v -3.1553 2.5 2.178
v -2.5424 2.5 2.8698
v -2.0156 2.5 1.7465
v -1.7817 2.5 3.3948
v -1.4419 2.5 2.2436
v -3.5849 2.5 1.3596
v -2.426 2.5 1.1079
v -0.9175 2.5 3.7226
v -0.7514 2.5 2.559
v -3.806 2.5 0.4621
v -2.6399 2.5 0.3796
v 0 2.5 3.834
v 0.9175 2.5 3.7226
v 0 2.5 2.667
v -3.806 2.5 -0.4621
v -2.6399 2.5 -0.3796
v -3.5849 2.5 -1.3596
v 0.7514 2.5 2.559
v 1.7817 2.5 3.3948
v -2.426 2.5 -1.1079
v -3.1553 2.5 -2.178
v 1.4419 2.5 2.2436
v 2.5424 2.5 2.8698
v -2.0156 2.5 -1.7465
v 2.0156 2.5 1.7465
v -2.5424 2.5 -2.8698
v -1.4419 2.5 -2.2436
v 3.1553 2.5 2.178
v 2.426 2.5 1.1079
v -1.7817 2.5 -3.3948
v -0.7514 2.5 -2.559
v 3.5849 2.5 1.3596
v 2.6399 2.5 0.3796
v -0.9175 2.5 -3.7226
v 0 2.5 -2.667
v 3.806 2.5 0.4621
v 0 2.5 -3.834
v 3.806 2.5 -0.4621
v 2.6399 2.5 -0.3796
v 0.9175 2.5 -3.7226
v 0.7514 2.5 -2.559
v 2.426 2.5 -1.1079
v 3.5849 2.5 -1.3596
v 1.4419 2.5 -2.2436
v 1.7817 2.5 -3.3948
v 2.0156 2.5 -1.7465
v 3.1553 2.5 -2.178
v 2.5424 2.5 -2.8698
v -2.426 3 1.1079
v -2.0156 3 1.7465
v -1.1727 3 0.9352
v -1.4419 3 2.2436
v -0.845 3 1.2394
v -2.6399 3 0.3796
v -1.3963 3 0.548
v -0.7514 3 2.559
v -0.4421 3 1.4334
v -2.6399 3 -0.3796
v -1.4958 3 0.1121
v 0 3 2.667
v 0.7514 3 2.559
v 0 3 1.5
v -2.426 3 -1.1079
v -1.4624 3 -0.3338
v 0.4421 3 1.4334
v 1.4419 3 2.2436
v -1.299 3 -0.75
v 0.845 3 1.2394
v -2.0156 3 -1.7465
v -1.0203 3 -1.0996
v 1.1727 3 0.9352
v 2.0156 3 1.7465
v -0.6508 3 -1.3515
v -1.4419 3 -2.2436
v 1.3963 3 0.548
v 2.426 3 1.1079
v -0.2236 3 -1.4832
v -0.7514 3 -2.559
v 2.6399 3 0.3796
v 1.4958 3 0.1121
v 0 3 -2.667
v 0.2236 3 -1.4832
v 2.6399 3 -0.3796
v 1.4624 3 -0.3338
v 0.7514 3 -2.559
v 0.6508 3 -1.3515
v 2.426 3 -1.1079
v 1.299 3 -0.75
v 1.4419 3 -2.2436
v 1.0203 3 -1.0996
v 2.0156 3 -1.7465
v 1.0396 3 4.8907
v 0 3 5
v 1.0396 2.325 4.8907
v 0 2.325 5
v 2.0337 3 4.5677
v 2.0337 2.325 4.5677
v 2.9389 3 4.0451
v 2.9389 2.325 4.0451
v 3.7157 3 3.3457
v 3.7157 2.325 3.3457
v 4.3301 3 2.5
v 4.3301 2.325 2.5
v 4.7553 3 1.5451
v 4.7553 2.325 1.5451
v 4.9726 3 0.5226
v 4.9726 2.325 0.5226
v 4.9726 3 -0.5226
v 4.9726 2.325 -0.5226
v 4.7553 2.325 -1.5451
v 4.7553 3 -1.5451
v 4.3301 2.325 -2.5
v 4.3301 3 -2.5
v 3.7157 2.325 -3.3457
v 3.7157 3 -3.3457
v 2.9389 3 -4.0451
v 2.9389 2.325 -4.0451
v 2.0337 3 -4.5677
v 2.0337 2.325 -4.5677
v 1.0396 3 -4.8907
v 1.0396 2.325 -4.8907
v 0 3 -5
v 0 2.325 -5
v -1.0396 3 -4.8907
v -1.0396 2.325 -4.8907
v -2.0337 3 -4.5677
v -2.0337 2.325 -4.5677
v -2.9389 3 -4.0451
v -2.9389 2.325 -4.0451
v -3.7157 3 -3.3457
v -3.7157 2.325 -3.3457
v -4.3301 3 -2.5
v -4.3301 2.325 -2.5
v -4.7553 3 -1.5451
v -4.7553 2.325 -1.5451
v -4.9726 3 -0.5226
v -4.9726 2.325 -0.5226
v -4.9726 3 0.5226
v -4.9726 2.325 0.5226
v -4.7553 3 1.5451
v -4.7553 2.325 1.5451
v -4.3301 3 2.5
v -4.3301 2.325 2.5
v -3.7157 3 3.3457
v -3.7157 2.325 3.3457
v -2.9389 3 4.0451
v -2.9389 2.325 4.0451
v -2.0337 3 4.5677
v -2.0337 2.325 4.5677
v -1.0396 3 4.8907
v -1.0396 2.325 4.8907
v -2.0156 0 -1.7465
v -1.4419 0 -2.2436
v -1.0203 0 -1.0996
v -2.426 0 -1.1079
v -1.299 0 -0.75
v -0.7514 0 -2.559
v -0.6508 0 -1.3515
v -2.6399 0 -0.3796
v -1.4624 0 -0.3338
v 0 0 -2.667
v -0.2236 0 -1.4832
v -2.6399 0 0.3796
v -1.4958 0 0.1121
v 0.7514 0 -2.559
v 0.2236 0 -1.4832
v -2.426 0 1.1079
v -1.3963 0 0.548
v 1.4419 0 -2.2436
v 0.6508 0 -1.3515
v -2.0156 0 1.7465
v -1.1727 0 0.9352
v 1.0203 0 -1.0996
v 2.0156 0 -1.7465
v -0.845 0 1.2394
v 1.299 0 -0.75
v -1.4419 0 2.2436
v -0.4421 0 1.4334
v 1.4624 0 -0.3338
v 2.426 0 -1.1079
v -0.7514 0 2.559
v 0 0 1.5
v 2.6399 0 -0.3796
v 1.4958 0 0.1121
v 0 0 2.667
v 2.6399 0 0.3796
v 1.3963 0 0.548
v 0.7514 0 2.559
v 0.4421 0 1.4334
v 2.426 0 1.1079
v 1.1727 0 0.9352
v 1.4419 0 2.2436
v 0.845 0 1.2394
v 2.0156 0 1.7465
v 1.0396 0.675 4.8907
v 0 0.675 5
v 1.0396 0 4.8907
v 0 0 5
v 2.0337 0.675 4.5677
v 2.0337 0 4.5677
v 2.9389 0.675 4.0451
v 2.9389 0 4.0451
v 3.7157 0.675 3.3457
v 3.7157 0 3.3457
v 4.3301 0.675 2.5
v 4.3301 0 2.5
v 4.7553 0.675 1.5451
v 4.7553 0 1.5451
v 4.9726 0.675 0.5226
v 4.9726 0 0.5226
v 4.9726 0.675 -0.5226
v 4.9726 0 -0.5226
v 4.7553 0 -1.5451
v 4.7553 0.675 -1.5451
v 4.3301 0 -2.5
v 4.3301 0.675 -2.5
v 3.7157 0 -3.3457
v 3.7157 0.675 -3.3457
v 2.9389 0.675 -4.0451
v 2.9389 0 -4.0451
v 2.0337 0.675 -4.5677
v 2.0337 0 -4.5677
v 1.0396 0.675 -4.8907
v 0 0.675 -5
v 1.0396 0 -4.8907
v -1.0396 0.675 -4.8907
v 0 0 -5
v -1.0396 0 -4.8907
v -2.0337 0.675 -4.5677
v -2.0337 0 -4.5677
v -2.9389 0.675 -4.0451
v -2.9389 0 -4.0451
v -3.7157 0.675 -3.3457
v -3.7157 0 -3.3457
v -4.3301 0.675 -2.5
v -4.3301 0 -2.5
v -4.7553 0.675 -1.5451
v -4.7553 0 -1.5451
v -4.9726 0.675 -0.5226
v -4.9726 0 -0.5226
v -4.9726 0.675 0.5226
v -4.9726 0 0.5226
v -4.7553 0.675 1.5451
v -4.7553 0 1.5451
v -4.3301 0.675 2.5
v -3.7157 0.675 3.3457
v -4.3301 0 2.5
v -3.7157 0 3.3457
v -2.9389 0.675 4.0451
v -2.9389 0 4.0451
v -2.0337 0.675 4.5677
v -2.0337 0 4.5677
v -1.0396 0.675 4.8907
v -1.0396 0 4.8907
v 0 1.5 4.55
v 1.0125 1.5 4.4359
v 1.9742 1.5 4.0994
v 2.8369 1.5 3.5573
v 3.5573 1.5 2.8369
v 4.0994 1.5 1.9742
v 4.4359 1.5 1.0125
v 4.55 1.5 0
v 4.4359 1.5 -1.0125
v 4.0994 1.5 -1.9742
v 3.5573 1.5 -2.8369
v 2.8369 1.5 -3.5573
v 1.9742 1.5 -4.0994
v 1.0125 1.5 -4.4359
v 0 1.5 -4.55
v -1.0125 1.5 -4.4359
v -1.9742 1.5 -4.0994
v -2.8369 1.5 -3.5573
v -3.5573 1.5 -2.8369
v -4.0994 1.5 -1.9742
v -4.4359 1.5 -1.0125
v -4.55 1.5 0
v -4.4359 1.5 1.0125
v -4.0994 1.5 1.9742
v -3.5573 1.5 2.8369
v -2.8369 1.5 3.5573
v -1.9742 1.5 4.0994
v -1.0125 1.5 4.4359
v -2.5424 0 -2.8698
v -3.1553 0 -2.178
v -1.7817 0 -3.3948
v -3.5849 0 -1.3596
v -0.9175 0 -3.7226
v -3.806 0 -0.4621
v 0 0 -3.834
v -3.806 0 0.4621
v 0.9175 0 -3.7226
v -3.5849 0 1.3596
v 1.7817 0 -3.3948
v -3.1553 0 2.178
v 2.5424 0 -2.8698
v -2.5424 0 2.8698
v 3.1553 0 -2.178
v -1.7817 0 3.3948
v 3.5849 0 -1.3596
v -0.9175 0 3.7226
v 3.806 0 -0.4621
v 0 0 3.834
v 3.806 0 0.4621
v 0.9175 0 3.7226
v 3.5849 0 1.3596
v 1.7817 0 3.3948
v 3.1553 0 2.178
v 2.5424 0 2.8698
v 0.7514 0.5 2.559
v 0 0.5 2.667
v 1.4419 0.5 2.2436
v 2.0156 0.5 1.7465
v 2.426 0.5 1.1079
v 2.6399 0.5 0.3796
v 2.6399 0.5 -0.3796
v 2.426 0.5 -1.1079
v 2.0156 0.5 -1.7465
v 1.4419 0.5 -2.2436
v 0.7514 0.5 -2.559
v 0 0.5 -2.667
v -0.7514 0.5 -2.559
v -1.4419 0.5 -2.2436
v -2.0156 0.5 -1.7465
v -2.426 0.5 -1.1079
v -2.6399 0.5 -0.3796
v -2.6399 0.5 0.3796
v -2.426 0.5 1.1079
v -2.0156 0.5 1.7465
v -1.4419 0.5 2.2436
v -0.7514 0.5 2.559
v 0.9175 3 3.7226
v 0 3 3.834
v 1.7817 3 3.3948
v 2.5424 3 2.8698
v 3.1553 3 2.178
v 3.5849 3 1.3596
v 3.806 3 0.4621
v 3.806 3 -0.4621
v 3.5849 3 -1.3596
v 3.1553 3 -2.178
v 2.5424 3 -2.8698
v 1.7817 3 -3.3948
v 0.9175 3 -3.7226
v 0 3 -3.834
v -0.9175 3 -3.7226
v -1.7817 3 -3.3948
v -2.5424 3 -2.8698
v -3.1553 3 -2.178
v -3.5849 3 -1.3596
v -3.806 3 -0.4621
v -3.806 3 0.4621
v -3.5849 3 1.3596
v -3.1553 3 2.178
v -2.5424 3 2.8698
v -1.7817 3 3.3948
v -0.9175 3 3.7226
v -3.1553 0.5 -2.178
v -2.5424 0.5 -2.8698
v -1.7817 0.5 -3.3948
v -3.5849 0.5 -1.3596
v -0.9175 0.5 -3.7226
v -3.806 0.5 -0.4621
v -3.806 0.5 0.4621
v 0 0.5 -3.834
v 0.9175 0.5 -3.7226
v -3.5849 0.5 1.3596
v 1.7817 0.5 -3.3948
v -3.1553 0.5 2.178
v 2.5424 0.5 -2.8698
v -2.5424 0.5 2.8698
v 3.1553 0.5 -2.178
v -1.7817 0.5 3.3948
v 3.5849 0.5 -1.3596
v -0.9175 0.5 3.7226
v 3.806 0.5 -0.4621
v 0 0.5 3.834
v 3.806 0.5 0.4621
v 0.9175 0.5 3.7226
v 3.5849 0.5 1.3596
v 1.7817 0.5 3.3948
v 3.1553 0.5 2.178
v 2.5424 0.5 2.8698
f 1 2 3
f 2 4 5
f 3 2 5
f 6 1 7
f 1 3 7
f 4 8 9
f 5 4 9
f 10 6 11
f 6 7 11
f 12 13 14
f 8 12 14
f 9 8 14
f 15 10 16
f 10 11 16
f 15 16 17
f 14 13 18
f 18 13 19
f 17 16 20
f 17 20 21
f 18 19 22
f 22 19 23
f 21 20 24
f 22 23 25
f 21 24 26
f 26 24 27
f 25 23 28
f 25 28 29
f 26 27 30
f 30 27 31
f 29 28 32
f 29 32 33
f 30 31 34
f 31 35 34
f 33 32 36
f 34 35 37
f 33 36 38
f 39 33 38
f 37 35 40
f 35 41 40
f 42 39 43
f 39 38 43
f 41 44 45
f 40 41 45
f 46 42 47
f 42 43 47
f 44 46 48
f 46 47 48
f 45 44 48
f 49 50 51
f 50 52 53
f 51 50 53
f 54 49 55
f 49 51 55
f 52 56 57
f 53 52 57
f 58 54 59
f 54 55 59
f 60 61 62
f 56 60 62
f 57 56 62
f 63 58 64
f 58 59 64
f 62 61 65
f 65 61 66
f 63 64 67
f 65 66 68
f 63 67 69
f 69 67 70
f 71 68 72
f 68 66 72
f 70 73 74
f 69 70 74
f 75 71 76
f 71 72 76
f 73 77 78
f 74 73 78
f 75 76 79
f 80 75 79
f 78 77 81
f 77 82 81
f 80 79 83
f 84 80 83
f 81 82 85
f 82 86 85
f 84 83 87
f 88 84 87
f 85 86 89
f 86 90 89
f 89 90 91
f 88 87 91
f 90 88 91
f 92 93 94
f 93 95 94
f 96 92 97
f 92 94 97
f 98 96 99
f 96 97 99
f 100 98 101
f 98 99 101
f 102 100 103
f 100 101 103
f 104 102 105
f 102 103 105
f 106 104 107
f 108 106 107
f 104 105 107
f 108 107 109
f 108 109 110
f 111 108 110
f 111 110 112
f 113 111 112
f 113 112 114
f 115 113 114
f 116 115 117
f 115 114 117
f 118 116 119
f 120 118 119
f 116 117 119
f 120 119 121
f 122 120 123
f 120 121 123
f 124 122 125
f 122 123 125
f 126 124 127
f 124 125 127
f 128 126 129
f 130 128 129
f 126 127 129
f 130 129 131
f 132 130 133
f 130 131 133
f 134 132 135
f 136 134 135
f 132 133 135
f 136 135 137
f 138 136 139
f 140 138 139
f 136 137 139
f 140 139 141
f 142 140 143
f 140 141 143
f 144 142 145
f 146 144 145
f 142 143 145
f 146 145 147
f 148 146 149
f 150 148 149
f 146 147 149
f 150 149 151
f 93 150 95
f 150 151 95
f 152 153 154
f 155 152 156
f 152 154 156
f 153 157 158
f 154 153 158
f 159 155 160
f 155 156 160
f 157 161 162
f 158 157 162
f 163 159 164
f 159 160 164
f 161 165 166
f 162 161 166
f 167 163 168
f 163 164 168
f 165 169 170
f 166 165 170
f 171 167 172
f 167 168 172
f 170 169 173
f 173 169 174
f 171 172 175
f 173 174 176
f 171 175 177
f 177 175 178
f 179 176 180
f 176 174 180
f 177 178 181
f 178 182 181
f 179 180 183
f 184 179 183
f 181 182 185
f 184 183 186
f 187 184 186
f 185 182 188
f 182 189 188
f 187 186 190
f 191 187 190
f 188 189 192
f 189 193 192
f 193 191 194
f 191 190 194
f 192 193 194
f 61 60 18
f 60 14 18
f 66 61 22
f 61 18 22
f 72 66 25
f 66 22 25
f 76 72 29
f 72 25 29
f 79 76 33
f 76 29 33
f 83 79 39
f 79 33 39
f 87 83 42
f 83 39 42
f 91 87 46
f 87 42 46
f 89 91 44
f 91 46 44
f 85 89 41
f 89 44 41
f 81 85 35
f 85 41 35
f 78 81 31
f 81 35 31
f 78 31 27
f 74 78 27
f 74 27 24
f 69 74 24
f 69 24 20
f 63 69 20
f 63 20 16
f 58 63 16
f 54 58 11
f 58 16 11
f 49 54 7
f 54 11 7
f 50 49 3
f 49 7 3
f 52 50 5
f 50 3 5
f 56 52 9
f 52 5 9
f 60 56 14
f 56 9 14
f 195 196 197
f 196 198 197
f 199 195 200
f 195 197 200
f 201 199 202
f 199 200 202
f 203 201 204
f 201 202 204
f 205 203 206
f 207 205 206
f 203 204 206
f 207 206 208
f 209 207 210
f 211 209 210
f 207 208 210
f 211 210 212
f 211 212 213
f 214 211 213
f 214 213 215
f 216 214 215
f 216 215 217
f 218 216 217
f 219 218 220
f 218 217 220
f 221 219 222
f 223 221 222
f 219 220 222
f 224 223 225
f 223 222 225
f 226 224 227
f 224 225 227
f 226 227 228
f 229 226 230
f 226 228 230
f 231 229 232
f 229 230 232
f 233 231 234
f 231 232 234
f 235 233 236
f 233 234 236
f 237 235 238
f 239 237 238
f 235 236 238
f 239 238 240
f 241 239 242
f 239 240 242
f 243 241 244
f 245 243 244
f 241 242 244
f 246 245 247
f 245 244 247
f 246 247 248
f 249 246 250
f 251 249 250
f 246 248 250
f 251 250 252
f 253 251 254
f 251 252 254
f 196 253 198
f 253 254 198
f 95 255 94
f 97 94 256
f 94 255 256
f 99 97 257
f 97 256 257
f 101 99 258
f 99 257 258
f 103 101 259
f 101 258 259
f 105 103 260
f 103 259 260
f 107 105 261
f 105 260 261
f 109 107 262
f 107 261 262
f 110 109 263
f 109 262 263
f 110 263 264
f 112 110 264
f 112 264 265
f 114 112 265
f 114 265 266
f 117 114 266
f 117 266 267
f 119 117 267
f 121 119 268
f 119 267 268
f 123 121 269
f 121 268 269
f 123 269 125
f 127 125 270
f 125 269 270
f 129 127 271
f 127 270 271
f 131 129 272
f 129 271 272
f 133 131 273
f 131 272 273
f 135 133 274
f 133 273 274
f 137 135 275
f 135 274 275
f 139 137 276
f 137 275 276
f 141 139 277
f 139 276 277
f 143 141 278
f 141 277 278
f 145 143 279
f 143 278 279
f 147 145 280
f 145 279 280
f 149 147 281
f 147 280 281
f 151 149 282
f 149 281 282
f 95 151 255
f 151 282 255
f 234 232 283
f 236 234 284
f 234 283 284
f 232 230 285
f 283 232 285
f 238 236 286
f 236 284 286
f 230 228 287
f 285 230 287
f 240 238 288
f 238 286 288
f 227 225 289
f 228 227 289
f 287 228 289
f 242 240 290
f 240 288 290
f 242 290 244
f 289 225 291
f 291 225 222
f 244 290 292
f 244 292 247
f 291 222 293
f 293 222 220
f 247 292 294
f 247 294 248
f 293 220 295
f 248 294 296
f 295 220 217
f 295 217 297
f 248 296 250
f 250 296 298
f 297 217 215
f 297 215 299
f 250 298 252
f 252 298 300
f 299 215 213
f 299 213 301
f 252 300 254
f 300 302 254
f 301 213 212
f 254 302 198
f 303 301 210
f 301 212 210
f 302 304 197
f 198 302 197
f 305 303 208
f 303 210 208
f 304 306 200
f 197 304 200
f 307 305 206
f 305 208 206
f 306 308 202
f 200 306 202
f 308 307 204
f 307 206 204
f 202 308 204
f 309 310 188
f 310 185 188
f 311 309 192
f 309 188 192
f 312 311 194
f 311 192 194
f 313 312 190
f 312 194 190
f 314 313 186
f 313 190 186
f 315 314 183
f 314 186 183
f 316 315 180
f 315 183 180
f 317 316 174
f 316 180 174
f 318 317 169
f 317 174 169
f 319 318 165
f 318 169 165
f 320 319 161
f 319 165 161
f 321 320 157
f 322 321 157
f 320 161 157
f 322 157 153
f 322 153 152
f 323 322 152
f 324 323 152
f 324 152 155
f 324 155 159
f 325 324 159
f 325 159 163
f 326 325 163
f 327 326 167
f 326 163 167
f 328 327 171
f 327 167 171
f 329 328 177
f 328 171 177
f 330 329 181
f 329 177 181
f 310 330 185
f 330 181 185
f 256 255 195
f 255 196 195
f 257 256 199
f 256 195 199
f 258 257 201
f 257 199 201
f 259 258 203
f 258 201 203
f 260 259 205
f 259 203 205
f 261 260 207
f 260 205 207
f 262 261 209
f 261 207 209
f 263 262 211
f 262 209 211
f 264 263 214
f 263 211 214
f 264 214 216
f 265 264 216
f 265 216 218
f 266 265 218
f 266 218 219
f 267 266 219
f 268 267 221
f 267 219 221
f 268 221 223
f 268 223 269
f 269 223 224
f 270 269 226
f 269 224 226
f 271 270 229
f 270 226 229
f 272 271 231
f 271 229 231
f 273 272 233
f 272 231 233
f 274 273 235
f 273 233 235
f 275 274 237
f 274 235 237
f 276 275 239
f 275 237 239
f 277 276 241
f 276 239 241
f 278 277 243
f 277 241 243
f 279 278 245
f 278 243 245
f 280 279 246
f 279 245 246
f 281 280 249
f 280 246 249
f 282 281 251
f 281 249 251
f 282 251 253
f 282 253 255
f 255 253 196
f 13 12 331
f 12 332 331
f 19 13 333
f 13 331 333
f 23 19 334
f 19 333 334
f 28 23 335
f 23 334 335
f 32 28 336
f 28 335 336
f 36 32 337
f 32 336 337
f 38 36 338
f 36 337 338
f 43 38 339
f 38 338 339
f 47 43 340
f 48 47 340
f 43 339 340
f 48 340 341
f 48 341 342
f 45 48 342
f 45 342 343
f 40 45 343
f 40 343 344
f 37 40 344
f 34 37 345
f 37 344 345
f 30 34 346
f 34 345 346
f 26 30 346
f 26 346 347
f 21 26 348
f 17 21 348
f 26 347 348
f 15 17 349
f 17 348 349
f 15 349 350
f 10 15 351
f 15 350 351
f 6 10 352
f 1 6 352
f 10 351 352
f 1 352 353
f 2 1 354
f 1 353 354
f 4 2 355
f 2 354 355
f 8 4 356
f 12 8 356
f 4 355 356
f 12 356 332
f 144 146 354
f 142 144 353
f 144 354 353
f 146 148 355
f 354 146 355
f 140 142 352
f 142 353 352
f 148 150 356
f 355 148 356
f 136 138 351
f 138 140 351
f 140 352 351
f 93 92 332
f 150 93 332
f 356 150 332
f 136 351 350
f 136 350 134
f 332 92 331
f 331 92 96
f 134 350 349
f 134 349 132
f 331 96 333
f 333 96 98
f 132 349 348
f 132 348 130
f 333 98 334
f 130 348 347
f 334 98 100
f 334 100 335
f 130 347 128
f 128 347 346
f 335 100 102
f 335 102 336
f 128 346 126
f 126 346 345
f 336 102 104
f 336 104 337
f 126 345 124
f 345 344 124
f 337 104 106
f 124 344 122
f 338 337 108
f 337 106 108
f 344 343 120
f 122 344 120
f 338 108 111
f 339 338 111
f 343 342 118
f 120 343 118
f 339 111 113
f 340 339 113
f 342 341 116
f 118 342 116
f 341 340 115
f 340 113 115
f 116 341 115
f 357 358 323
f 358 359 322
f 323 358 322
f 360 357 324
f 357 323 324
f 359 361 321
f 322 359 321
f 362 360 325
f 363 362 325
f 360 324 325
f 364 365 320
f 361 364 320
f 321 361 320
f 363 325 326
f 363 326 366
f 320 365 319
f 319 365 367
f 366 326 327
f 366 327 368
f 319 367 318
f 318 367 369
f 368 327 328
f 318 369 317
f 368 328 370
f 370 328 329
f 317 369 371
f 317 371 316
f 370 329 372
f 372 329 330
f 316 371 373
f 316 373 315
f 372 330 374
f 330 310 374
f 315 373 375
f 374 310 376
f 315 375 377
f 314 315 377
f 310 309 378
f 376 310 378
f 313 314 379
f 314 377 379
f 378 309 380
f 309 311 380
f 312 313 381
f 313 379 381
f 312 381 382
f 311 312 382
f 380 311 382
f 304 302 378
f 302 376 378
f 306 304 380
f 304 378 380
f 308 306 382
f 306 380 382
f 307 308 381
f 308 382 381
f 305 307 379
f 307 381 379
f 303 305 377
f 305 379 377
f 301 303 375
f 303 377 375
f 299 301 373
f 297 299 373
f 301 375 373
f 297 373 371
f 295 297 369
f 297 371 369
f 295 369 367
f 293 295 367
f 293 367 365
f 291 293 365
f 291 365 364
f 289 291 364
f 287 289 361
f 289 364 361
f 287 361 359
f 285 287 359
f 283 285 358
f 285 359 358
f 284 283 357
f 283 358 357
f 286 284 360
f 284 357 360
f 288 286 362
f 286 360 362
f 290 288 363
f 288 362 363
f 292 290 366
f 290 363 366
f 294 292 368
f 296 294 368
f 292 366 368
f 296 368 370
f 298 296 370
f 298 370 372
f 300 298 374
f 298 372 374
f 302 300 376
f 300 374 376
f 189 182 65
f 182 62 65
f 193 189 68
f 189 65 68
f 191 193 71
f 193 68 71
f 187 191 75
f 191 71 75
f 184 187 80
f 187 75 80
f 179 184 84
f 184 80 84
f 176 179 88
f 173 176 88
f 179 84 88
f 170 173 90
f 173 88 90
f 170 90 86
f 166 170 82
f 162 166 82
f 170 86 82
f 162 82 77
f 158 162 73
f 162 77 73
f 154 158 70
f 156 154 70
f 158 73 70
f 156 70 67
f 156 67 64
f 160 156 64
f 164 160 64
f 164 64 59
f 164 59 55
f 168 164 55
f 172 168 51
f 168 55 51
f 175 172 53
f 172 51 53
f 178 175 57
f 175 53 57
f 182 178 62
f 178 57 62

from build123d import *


with BuildPart() as f1:
    # F0 (on Right) → F1 (revolve)
    with BuildSketch(Plane.YZ):
        Polygon((0, 2.667), (0, 1.5), (3, 1.5), (3, 2.667), (2.5, 2.667), (2.5, 3.834), (3, 3.834), (3, 5), (2.325, 5), (1.5, 4.55), (0.675, 5), (0, 5), (0, 3.834), (0.5, 3.834), (0.5, 2.667), align=None)
    revolve(axis=Axis((0, 1.5, 0), (0, 1, 0)))


solid = f1.part
